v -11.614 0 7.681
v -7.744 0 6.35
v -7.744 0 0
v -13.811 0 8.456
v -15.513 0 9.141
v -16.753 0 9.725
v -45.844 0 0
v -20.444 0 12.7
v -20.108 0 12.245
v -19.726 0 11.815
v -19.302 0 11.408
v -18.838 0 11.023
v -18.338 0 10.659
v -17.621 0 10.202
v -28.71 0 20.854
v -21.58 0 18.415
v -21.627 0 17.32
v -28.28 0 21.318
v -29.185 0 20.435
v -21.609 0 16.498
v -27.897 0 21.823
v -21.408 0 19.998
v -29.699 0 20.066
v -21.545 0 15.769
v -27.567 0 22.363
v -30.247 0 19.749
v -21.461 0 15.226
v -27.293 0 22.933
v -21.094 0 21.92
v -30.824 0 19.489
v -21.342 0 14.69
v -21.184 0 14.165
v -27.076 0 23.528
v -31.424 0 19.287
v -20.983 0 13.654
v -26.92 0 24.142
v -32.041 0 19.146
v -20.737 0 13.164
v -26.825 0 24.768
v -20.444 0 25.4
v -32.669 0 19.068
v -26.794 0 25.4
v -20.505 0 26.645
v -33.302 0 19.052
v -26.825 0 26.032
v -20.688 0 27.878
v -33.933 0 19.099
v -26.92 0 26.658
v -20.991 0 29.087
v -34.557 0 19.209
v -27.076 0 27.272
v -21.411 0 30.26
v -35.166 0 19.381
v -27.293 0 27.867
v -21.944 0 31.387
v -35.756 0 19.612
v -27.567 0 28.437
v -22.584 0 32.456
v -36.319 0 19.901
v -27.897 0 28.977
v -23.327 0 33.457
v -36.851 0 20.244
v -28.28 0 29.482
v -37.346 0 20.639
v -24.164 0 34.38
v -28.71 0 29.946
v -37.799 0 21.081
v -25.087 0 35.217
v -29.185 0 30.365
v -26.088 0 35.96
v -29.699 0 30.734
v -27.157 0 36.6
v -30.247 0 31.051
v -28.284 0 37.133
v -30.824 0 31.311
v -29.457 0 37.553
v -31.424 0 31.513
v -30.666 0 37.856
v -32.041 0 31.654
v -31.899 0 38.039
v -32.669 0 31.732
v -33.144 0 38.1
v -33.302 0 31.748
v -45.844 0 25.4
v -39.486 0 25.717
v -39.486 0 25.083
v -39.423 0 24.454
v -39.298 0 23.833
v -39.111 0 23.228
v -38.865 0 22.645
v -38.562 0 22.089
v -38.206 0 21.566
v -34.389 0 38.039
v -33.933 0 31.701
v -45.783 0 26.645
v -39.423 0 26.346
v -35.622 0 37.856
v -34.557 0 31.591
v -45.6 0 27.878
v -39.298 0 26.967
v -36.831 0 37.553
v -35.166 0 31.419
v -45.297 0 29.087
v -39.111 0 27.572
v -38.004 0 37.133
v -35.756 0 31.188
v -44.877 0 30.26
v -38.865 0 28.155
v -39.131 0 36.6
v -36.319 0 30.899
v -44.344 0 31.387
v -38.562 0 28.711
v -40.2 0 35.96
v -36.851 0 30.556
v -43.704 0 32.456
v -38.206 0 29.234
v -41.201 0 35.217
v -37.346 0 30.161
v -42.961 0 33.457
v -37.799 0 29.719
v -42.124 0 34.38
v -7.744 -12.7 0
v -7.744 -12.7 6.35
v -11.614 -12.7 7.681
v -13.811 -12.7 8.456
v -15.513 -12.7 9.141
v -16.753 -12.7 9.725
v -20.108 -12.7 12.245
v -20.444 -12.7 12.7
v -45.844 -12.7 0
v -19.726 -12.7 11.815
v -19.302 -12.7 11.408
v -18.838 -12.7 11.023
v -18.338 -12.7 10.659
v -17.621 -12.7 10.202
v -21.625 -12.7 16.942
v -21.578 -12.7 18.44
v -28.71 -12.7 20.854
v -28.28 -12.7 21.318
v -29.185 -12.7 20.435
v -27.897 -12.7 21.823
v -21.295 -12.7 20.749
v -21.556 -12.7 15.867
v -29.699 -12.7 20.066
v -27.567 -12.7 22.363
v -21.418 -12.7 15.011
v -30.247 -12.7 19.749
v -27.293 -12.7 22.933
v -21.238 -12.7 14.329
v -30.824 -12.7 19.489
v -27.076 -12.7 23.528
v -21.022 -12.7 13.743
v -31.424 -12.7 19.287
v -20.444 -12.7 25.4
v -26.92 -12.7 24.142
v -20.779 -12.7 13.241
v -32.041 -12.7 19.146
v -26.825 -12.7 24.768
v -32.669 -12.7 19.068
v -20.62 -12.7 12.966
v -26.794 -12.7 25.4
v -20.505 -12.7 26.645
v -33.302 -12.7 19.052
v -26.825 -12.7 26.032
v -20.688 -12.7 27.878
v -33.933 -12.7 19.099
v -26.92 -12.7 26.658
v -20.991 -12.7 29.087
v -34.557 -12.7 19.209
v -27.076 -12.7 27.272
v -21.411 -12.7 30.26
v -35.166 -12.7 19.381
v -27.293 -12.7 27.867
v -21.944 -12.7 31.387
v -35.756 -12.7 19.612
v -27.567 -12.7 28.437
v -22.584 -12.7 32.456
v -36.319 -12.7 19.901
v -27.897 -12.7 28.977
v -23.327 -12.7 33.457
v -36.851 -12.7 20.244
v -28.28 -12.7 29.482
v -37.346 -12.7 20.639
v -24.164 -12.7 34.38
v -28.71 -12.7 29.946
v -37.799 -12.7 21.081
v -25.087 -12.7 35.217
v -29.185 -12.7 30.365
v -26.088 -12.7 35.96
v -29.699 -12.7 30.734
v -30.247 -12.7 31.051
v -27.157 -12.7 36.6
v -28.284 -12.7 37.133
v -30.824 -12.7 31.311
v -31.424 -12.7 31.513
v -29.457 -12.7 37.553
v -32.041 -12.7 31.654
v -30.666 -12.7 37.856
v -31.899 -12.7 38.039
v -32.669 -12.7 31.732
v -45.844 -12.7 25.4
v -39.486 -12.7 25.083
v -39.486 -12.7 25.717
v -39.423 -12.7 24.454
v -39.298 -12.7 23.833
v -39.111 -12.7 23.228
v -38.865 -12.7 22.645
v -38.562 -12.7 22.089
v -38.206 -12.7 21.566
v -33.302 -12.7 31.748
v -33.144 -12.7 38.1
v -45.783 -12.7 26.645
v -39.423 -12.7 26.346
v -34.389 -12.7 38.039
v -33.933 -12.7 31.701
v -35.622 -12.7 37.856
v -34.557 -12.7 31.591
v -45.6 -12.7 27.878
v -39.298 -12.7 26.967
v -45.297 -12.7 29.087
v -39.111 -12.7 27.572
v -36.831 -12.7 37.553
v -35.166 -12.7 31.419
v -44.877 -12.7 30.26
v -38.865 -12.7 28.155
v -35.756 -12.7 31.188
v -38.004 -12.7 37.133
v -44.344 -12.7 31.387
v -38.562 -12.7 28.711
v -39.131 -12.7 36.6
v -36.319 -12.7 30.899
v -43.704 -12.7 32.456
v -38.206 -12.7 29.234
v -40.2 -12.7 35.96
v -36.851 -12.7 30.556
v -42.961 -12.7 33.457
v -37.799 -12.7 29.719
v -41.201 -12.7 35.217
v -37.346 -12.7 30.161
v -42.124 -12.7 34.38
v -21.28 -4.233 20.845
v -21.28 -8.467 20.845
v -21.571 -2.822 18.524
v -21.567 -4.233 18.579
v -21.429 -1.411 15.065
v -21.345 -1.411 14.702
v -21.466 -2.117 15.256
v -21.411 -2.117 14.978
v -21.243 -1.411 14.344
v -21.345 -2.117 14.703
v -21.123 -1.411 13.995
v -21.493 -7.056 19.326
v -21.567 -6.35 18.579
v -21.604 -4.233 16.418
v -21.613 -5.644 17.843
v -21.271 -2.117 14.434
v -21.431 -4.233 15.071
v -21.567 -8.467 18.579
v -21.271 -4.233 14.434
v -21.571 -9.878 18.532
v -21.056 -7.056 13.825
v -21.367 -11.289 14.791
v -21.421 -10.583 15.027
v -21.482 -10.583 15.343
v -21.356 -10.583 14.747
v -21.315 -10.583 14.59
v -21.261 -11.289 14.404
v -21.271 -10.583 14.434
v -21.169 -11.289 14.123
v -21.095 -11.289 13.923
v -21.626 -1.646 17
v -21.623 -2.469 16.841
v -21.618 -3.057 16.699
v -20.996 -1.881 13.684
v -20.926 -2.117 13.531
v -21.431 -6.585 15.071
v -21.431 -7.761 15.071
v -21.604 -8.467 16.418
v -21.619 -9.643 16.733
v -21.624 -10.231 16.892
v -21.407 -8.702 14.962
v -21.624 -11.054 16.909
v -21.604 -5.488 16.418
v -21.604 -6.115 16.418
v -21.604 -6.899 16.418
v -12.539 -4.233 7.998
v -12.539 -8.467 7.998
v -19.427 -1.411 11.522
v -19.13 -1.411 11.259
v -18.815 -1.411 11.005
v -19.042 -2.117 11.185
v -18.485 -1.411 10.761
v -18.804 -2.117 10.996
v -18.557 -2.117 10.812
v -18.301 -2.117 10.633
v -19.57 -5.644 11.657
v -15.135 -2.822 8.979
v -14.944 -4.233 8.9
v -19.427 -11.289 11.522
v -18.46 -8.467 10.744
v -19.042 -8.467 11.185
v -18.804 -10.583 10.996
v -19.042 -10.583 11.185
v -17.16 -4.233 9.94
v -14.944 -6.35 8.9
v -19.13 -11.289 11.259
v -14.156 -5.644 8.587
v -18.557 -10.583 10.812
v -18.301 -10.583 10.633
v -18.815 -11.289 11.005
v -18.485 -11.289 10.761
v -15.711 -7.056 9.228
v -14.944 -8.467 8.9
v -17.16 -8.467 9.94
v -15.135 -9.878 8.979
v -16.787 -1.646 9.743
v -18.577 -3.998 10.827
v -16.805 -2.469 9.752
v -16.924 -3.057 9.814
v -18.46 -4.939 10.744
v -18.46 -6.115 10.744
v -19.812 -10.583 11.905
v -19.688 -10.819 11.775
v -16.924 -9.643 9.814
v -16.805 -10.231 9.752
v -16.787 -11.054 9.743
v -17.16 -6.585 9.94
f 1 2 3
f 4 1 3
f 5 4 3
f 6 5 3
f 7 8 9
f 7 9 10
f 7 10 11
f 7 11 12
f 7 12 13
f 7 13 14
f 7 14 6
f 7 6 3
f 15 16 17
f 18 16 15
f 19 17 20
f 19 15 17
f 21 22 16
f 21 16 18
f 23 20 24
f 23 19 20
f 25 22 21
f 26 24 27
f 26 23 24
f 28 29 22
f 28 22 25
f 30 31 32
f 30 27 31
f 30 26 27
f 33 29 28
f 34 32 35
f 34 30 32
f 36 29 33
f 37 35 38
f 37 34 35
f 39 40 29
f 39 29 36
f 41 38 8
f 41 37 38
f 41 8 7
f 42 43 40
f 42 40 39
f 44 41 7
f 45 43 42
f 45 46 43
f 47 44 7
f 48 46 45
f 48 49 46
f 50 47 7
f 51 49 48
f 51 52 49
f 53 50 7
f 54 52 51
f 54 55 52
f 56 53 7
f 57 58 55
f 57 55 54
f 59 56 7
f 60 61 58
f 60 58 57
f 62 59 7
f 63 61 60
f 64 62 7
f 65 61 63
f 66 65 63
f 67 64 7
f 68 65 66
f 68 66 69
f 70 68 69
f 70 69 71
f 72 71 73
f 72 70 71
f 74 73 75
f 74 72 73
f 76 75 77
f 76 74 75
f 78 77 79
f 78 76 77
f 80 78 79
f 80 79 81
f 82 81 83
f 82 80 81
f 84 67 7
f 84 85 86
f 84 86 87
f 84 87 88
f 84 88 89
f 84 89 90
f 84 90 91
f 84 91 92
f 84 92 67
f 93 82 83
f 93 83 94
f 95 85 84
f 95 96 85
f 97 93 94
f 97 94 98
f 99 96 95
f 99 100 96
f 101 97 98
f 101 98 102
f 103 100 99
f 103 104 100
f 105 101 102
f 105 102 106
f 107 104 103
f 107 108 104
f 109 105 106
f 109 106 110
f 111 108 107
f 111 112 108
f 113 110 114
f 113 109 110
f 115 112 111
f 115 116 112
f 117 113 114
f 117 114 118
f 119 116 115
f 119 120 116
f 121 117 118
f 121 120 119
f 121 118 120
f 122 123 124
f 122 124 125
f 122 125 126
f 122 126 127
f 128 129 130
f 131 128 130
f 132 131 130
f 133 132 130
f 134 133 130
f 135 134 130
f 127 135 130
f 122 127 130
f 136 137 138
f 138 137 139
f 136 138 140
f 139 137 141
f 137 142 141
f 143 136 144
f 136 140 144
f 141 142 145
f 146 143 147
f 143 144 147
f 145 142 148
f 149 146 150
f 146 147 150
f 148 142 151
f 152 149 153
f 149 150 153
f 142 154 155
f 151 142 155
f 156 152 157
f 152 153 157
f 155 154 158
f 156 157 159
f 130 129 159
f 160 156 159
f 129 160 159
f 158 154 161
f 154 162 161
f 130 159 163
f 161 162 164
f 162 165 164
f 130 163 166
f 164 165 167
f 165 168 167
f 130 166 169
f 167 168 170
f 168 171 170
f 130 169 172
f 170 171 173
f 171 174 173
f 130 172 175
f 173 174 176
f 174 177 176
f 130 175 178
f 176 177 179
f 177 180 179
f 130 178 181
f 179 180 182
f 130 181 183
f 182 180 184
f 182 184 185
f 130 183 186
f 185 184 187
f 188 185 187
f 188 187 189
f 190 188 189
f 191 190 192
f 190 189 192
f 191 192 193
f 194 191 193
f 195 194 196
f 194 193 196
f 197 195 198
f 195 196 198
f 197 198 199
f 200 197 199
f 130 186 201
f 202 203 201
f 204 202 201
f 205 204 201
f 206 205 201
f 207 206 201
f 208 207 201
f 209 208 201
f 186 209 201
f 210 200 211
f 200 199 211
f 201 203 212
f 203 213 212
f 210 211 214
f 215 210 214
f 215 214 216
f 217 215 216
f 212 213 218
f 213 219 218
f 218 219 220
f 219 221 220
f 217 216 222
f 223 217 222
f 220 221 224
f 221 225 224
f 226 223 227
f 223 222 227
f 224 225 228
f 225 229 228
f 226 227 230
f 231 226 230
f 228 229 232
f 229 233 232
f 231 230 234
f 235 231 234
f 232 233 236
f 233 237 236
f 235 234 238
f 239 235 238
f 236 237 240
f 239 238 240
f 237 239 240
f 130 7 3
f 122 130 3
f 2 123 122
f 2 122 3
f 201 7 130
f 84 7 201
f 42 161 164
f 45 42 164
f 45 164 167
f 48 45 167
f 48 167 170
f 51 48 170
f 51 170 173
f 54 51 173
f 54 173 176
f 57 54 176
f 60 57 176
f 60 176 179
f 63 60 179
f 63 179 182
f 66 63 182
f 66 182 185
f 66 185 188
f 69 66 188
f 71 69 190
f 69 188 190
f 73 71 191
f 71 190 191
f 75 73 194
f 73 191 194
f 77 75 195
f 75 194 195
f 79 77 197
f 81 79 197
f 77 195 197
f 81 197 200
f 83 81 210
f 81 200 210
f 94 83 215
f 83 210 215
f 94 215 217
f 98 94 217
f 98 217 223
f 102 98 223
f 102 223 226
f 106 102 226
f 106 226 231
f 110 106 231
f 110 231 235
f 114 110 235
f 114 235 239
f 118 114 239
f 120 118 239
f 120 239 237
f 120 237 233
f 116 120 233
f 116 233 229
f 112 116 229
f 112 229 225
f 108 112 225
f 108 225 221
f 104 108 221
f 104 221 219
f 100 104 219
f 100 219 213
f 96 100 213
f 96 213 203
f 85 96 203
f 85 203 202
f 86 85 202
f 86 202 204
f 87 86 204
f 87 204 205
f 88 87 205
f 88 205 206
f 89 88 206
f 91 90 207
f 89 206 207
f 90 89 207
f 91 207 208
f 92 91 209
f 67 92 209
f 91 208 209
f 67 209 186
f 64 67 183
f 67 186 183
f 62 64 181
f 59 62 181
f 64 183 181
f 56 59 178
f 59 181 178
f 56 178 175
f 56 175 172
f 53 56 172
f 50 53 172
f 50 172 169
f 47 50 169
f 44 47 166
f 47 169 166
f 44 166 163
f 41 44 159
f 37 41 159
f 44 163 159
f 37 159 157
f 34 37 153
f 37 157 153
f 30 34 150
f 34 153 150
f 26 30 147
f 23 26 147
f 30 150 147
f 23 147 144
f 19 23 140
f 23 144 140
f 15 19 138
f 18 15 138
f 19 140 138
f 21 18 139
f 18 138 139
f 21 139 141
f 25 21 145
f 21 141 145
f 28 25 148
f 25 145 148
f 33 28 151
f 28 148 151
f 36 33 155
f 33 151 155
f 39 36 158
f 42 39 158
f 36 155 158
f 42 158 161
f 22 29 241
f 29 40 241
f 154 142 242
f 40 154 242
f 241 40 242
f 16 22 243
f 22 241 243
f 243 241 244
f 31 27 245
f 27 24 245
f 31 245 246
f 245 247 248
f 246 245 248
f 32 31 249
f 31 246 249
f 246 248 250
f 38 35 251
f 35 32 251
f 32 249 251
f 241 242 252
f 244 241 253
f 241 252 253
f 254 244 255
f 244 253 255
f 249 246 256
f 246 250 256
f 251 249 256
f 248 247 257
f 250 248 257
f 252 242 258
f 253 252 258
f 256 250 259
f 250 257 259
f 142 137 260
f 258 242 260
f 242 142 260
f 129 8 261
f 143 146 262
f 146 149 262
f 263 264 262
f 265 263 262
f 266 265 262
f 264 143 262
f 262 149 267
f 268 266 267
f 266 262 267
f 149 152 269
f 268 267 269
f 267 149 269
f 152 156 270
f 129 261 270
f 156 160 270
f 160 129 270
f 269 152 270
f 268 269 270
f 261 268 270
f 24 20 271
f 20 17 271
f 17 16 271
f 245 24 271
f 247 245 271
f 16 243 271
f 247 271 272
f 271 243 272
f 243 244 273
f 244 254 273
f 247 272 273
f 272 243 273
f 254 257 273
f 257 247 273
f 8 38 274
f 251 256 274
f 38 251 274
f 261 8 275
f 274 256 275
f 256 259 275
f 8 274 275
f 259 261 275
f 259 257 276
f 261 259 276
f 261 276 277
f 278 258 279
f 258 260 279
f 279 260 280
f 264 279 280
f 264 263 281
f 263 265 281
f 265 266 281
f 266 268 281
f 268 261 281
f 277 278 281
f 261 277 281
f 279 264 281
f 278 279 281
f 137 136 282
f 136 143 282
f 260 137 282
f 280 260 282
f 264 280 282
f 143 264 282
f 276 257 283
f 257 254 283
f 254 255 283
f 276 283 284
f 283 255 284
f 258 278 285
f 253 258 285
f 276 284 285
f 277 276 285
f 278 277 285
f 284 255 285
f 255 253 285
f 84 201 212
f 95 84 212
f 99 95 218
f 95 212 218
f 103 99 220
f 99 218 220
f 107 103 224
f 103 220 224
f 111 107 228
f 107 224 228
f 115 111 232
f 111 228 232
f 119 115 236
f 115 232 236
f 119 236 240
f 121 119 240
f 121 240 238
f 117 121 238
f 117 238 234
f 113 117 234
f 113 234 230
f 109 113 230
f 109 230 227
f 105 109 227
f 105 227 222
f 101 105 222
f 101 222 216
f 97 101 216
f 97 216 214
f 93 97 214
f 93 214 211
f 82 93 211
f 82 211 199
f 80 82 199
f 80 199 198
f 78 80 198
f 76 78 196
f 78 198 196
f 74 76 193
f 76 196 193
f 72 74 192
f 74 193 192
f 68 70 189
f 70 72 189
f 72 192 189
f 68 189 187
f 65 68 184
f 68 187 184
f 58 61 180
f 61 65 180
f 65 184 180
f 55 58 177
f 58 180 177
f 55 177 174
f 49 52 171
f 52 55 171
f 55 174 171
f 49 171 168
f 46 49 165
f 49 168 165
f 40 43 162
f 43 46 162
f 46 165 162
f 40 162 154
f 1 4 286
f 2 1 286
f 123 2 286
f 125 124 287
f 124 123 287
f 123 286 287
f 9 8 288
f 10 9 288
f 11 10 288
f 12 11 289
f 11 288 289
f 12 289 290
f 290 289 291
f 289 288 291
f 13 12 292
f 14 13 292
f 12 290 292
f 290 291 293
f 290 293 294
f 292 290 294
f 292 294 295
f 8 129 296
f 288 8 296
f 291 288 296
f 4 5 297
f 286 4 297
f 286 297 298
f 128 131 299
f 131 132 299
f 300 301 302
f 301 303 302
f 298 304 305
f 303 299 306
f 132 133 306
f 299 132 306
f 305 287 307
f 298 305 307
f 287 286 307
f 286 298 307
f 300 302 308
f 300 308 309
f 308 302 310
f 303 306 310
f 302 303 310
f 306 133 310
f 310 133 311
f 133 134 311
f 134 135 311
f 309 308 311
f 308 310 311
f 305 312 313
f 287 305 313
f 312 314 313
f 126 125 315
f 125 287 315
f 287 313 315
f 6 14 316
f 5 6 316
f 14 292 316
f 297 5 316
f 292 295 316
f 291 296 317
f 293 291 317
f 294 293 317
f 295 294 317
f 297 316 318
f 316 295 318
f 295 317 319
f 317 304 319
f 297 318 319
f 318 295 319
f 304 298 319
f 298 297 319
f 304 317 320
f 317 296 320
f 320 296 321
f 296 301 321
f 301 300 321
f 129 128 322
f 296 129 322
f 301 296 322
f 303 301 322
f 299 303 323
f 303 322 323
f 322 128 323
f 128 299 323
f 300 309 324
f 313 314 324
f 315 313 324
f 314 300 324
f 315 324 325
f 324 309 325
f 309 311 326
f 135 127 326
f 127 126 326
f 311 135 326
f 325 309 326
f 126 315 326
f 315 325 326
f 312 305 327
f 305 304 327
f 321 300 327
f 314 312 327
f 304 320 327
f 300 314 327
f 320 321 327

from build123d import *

# Parameters (mm, degrees)
F0_W      = 63.5
F0_H      = 6.35
F1_DEPTH  = 38.1
F2_W      = 25.4
F2_H      = 38.1
F3_DEPTH  = 12.7
F5_DEPTH  = 25.4
F6_R      = 6.35
F7_DEPTH  = 25.4
F9_DEPTH  = 25.4
F11_DEPTH = 12.7
F12_R     = 3.4395833333
F13_DEPTH = 25.4
F14_DEPTH = 25.4


with BuildPart() as f1:
    # F0 (on Front) → F1 (new body)
    with BuildSketch(Plane.XZ):
        with Locations((-14.0939018427, 3.175)):
            Rectangle(F0_W, F0_H)
    extrude(amount=F1_DEPTH)

    # F2 (on face) → F3 (join)
    with BuildSketch(Plane(origin=(0, 0, 0), x_dir=(-1, 0, 0), z_dir=(0, 1, 0))):
        with Locations((33.1439018427, 25.4)):
            Rectangle(F2_W, F2_H)
    extrude(amount=-F3_DEPTH)

    # F4 (on face) → F5 (cut)
    with BuildSketch(Plane.XZ.offset(12.7)):
        with BuildLine():
            ThreePointArc((-45.8439018427, 25.4), (-33.1439018427, 38.1), (-20.4439018427, 25.4))
            Line((-20.4439018427, 25.4), (-20.4439018427, 44.45))
            Line((-20.4439018427, 44.45), (-45.8439018427, 44.45))
            Line((-45.8439018427, 44.45), (-45.8439018427, 25.4))
        make_face()
    extrude(amount=-F5_DEPTH, mode=Mode.SUBTRACT)

    # F6 (on face) → F7 (cut)
    with BuildSketch(Plane.XZ.offset(12.7)):
        with Locations((-33.1439018427, 25.4)):
            Circle(F6_R)
    extrude(amount=-F7_DEPTH, mode=Mode.SUBTRACT)

    # F8 (on face) → F9 (cut)
    with BuildSketch(Plane.XZ.offset(12.7)):
        with BuildLine():
            add(Edge.make_bspline(
                [(-20.4439018427, 25.4), (-21.2112794526, 20.9739528082), (-22.6711814471, 15.8700383759), (-20.4439018427, 12.7)],
                knots=[0, 0, 0, 0, 0.4860571438, 0.4860571438, 0.4860571438, 0.4860571438], degree=3))
            Line((-20.4439018427, 12.7), (-20.4439018427, 25.4))
        make_face()
    extrude(amount=-F9_DEPTH, mode=Mode.SUBTRACT)

    # F10 (on face) → F11 (join)
    with BuildSketch(Plane.XZ.offset(12.7)):
        with BuildLine():
            add(Edge.make_bspline(
                [(-20.4439018427, 12.7), (-18.2158628234, 9.3571333053), (-12.2381824129, 8.0261796099), (-7.7439018427, 6.35)],
                knots=[0.4860571438, 0.4860571438, 0.4860571438, 0.4860571438, 1, 1, 1, 1], degree=3))
            Line((-20.4439018427, 12.7), (-20.4439018427, 6.35))
            Line((-20.4439018427, 6.35), (-7.7439018427, 6.35))
        make_face()
    extrude(amount=-F11_DEPTH)

    # F12 (on face) → F13 (cut)
    with BuildSketch(Plane.XY.offset(6.35)):
        with Locations((8.1310981573, -9.2604166667)):
            Circle(F12_R)
    extrude(amount=-F13_DEPTH, mode=Mode.SUBTRACT)

    # F14 (cut): a face of the model
    f14_faces = [f1.faces().sort_by_distance(p)[0] for p in [
        (-11.2918846227, -22.4788355031, 6.35),
    ]]
    extrude(f14_faces, amount=-F14_DEPTH, mode=Mode.SUBTRACT)


solid = f1.part
